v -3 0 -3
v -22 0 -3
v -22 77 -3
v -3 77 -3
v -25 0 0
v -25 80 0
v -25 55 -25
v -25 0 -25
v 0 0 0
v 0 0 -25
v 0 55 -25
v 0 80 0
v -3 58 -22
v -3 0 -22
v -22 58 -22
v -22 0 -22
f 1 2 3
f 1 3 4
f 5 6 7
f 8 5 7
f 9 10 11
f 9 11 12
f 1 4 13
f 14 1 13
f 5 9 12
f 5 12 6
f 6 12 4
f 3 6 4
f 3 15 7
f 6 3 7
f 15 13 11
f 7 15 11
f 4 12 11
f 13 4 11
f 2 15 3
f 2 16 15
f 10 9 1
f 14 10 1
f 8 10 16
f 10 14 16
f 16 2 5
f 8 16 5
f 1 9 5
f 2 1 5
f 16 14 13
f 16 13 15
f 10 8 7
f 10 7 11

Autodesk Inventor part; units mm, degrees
ref_plane "YZ Plane" through (0, 0, 0) normal (1, 0, 0) x (0, 1, 0)
ref_plane "XZ Plane" through (0, 0, 0) normal (0, 1, 0) x (-1, 0, 0)
ref_plane "XY Plane" through (0, 0, 0) normal (0, 0, 1) x (1, 0, 0)
sketch "Sketch1" plane through (0, 0, 0) normal (0, 1, 0) x (-1, 0, 0)
  line L0 (0, 0) -> (25, 0)
  line L1 (25, 0) -> (25, -25)
  line L2 (25, -25) -> (0, -25)
  line L3 (0, -25) -> (0, 0)
  line L4 (22, -22) -> (22, -3)
  line L5 (22, -3) -> (3, -3)
  line L6 (3, -3) -> (3, -22)
  line L7 (3, -22) -> (22, -22)
  dimension "d0" = 25
  dimension "d1" = 25
  dimension "d2" = 3
extrude "Extrusion1" add sketch "Sketch1" along normal blind 80
sketch "Sketch2" plane through (0, 0, 0) normal (1, 0, 0) x (0, 0, -1)
  line L0 (0, 0) -> (25, 0) projected
  line L1 (25, 0) -> (25, 80) projected
  line L2 (0, 80) -> (25, 80) projected
  line L3 (0, 0) -> (0, 80) projected
  line L4 (0, 0) -> (0, 80) projected
  line L5 (0, 80) -> (25, 55)
  line L6 (0, 80) -> (35.3553, 80) construction
  dimension "d5" = 45
extrude "Extrusion2" cut sketch "Sketch2" against normal blind 80 contours L2 L1 L5
properties part number "P403" material "Aluminum 6061"
